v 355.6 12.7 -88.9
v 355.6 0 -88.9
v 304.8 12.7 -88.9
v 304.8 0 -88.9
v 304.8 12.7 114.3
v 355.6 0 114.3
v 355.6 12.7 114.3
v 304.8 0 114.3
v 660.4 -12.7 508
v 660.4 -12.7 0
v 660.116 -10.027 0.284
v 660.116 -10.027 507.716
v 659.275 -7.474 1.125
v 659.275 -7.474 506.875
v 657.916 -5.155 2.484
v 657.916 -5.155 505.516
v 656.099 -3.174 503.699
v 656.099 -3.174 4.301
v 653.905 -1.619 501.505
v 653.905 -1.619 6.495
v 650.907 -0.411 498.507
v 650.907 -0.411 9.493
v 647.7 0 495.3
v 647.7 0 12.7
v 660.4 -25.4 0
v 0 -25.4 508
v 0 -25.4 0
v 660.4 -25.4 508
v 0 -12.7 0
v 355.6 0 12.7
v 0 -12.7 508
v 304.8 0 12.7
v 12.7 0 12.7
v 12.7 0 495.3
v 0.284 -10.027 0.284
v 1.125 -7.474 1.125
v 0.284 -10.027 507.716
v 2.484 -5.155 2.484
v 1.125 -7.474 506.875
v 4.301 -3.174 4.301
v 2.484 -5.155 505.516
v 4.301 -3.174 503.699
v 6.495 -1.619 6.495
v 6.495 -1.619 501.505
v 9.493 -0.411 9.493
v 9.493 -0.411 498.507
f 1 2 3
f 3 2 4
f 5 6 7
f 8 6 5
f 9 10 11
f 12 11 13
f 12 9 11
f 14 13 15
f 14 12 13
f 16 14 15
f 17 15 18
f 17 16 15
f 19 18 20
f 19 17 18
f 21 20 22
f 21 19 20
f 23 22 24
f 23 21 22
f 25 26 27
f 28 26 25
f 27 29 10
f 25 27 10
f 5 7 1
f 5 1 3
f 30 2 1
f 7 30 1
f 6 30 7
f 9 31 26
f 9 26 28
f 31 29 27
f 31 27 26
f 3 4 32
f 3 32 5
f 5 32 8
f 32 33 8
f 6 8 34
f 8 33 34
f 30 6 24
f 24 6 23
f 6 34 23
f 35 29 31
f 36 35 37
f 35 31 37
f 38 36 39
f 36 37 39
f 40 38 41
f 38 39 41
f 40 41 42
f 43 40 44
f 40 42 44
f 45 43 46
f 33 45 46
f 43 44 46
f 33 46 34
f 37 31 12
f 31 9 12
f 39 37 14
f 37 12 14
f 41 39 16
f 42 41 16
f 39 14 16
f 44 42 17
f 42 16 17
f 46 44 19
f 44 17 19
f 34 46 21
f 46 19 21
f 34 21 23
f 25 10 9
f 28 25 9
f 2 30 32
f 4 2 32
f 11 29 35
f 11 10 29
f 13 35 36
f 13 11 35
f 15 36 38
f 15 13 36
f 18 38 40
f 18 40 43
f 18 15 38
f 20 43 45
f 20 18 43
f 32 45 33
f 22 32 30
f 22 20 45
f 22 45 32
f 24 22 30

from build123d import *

# Parameters (mm, degrees)
F0_W     = 660.4
F0_H     = 508
F1_DEPTH = 25.4
F2_R     = 12.7
F3_W     = 50.8
F3_H     = 203.2
F4_DEPTH = 12.7


with BuildPart() as f1:
    # F0 (on Front) → F1 (new body)
    with BuildSketch(Plane.XZ):
        with Locations((330.2, 254)):
            Rectangle(F0_W, F0_H)
    extrude(amount=F1_DEPTH)

    # F2
    f2_edges = [f1.edges().sort_by_distance(p)[0] for p in [
        (330.2, 0, 508),
        (660.4, 0, 254),
        (330.2, 0, 0),
        (0, 0, 254),
    ]]
    fillet(f2_edges, radius=F2_R)

    # F3 (on face) → F4 (join)
    with BuildSketch(Plane(origin=(0, 0, 0), x_dir=(-1, 0, 0), z_dir=(0, 1, 0))):
        with Locations((-330.2, 12.7)):
            Rectangle(F3_W, F3_H)
    extrude(amount=F4_DEPTH)


solid = f1.part
